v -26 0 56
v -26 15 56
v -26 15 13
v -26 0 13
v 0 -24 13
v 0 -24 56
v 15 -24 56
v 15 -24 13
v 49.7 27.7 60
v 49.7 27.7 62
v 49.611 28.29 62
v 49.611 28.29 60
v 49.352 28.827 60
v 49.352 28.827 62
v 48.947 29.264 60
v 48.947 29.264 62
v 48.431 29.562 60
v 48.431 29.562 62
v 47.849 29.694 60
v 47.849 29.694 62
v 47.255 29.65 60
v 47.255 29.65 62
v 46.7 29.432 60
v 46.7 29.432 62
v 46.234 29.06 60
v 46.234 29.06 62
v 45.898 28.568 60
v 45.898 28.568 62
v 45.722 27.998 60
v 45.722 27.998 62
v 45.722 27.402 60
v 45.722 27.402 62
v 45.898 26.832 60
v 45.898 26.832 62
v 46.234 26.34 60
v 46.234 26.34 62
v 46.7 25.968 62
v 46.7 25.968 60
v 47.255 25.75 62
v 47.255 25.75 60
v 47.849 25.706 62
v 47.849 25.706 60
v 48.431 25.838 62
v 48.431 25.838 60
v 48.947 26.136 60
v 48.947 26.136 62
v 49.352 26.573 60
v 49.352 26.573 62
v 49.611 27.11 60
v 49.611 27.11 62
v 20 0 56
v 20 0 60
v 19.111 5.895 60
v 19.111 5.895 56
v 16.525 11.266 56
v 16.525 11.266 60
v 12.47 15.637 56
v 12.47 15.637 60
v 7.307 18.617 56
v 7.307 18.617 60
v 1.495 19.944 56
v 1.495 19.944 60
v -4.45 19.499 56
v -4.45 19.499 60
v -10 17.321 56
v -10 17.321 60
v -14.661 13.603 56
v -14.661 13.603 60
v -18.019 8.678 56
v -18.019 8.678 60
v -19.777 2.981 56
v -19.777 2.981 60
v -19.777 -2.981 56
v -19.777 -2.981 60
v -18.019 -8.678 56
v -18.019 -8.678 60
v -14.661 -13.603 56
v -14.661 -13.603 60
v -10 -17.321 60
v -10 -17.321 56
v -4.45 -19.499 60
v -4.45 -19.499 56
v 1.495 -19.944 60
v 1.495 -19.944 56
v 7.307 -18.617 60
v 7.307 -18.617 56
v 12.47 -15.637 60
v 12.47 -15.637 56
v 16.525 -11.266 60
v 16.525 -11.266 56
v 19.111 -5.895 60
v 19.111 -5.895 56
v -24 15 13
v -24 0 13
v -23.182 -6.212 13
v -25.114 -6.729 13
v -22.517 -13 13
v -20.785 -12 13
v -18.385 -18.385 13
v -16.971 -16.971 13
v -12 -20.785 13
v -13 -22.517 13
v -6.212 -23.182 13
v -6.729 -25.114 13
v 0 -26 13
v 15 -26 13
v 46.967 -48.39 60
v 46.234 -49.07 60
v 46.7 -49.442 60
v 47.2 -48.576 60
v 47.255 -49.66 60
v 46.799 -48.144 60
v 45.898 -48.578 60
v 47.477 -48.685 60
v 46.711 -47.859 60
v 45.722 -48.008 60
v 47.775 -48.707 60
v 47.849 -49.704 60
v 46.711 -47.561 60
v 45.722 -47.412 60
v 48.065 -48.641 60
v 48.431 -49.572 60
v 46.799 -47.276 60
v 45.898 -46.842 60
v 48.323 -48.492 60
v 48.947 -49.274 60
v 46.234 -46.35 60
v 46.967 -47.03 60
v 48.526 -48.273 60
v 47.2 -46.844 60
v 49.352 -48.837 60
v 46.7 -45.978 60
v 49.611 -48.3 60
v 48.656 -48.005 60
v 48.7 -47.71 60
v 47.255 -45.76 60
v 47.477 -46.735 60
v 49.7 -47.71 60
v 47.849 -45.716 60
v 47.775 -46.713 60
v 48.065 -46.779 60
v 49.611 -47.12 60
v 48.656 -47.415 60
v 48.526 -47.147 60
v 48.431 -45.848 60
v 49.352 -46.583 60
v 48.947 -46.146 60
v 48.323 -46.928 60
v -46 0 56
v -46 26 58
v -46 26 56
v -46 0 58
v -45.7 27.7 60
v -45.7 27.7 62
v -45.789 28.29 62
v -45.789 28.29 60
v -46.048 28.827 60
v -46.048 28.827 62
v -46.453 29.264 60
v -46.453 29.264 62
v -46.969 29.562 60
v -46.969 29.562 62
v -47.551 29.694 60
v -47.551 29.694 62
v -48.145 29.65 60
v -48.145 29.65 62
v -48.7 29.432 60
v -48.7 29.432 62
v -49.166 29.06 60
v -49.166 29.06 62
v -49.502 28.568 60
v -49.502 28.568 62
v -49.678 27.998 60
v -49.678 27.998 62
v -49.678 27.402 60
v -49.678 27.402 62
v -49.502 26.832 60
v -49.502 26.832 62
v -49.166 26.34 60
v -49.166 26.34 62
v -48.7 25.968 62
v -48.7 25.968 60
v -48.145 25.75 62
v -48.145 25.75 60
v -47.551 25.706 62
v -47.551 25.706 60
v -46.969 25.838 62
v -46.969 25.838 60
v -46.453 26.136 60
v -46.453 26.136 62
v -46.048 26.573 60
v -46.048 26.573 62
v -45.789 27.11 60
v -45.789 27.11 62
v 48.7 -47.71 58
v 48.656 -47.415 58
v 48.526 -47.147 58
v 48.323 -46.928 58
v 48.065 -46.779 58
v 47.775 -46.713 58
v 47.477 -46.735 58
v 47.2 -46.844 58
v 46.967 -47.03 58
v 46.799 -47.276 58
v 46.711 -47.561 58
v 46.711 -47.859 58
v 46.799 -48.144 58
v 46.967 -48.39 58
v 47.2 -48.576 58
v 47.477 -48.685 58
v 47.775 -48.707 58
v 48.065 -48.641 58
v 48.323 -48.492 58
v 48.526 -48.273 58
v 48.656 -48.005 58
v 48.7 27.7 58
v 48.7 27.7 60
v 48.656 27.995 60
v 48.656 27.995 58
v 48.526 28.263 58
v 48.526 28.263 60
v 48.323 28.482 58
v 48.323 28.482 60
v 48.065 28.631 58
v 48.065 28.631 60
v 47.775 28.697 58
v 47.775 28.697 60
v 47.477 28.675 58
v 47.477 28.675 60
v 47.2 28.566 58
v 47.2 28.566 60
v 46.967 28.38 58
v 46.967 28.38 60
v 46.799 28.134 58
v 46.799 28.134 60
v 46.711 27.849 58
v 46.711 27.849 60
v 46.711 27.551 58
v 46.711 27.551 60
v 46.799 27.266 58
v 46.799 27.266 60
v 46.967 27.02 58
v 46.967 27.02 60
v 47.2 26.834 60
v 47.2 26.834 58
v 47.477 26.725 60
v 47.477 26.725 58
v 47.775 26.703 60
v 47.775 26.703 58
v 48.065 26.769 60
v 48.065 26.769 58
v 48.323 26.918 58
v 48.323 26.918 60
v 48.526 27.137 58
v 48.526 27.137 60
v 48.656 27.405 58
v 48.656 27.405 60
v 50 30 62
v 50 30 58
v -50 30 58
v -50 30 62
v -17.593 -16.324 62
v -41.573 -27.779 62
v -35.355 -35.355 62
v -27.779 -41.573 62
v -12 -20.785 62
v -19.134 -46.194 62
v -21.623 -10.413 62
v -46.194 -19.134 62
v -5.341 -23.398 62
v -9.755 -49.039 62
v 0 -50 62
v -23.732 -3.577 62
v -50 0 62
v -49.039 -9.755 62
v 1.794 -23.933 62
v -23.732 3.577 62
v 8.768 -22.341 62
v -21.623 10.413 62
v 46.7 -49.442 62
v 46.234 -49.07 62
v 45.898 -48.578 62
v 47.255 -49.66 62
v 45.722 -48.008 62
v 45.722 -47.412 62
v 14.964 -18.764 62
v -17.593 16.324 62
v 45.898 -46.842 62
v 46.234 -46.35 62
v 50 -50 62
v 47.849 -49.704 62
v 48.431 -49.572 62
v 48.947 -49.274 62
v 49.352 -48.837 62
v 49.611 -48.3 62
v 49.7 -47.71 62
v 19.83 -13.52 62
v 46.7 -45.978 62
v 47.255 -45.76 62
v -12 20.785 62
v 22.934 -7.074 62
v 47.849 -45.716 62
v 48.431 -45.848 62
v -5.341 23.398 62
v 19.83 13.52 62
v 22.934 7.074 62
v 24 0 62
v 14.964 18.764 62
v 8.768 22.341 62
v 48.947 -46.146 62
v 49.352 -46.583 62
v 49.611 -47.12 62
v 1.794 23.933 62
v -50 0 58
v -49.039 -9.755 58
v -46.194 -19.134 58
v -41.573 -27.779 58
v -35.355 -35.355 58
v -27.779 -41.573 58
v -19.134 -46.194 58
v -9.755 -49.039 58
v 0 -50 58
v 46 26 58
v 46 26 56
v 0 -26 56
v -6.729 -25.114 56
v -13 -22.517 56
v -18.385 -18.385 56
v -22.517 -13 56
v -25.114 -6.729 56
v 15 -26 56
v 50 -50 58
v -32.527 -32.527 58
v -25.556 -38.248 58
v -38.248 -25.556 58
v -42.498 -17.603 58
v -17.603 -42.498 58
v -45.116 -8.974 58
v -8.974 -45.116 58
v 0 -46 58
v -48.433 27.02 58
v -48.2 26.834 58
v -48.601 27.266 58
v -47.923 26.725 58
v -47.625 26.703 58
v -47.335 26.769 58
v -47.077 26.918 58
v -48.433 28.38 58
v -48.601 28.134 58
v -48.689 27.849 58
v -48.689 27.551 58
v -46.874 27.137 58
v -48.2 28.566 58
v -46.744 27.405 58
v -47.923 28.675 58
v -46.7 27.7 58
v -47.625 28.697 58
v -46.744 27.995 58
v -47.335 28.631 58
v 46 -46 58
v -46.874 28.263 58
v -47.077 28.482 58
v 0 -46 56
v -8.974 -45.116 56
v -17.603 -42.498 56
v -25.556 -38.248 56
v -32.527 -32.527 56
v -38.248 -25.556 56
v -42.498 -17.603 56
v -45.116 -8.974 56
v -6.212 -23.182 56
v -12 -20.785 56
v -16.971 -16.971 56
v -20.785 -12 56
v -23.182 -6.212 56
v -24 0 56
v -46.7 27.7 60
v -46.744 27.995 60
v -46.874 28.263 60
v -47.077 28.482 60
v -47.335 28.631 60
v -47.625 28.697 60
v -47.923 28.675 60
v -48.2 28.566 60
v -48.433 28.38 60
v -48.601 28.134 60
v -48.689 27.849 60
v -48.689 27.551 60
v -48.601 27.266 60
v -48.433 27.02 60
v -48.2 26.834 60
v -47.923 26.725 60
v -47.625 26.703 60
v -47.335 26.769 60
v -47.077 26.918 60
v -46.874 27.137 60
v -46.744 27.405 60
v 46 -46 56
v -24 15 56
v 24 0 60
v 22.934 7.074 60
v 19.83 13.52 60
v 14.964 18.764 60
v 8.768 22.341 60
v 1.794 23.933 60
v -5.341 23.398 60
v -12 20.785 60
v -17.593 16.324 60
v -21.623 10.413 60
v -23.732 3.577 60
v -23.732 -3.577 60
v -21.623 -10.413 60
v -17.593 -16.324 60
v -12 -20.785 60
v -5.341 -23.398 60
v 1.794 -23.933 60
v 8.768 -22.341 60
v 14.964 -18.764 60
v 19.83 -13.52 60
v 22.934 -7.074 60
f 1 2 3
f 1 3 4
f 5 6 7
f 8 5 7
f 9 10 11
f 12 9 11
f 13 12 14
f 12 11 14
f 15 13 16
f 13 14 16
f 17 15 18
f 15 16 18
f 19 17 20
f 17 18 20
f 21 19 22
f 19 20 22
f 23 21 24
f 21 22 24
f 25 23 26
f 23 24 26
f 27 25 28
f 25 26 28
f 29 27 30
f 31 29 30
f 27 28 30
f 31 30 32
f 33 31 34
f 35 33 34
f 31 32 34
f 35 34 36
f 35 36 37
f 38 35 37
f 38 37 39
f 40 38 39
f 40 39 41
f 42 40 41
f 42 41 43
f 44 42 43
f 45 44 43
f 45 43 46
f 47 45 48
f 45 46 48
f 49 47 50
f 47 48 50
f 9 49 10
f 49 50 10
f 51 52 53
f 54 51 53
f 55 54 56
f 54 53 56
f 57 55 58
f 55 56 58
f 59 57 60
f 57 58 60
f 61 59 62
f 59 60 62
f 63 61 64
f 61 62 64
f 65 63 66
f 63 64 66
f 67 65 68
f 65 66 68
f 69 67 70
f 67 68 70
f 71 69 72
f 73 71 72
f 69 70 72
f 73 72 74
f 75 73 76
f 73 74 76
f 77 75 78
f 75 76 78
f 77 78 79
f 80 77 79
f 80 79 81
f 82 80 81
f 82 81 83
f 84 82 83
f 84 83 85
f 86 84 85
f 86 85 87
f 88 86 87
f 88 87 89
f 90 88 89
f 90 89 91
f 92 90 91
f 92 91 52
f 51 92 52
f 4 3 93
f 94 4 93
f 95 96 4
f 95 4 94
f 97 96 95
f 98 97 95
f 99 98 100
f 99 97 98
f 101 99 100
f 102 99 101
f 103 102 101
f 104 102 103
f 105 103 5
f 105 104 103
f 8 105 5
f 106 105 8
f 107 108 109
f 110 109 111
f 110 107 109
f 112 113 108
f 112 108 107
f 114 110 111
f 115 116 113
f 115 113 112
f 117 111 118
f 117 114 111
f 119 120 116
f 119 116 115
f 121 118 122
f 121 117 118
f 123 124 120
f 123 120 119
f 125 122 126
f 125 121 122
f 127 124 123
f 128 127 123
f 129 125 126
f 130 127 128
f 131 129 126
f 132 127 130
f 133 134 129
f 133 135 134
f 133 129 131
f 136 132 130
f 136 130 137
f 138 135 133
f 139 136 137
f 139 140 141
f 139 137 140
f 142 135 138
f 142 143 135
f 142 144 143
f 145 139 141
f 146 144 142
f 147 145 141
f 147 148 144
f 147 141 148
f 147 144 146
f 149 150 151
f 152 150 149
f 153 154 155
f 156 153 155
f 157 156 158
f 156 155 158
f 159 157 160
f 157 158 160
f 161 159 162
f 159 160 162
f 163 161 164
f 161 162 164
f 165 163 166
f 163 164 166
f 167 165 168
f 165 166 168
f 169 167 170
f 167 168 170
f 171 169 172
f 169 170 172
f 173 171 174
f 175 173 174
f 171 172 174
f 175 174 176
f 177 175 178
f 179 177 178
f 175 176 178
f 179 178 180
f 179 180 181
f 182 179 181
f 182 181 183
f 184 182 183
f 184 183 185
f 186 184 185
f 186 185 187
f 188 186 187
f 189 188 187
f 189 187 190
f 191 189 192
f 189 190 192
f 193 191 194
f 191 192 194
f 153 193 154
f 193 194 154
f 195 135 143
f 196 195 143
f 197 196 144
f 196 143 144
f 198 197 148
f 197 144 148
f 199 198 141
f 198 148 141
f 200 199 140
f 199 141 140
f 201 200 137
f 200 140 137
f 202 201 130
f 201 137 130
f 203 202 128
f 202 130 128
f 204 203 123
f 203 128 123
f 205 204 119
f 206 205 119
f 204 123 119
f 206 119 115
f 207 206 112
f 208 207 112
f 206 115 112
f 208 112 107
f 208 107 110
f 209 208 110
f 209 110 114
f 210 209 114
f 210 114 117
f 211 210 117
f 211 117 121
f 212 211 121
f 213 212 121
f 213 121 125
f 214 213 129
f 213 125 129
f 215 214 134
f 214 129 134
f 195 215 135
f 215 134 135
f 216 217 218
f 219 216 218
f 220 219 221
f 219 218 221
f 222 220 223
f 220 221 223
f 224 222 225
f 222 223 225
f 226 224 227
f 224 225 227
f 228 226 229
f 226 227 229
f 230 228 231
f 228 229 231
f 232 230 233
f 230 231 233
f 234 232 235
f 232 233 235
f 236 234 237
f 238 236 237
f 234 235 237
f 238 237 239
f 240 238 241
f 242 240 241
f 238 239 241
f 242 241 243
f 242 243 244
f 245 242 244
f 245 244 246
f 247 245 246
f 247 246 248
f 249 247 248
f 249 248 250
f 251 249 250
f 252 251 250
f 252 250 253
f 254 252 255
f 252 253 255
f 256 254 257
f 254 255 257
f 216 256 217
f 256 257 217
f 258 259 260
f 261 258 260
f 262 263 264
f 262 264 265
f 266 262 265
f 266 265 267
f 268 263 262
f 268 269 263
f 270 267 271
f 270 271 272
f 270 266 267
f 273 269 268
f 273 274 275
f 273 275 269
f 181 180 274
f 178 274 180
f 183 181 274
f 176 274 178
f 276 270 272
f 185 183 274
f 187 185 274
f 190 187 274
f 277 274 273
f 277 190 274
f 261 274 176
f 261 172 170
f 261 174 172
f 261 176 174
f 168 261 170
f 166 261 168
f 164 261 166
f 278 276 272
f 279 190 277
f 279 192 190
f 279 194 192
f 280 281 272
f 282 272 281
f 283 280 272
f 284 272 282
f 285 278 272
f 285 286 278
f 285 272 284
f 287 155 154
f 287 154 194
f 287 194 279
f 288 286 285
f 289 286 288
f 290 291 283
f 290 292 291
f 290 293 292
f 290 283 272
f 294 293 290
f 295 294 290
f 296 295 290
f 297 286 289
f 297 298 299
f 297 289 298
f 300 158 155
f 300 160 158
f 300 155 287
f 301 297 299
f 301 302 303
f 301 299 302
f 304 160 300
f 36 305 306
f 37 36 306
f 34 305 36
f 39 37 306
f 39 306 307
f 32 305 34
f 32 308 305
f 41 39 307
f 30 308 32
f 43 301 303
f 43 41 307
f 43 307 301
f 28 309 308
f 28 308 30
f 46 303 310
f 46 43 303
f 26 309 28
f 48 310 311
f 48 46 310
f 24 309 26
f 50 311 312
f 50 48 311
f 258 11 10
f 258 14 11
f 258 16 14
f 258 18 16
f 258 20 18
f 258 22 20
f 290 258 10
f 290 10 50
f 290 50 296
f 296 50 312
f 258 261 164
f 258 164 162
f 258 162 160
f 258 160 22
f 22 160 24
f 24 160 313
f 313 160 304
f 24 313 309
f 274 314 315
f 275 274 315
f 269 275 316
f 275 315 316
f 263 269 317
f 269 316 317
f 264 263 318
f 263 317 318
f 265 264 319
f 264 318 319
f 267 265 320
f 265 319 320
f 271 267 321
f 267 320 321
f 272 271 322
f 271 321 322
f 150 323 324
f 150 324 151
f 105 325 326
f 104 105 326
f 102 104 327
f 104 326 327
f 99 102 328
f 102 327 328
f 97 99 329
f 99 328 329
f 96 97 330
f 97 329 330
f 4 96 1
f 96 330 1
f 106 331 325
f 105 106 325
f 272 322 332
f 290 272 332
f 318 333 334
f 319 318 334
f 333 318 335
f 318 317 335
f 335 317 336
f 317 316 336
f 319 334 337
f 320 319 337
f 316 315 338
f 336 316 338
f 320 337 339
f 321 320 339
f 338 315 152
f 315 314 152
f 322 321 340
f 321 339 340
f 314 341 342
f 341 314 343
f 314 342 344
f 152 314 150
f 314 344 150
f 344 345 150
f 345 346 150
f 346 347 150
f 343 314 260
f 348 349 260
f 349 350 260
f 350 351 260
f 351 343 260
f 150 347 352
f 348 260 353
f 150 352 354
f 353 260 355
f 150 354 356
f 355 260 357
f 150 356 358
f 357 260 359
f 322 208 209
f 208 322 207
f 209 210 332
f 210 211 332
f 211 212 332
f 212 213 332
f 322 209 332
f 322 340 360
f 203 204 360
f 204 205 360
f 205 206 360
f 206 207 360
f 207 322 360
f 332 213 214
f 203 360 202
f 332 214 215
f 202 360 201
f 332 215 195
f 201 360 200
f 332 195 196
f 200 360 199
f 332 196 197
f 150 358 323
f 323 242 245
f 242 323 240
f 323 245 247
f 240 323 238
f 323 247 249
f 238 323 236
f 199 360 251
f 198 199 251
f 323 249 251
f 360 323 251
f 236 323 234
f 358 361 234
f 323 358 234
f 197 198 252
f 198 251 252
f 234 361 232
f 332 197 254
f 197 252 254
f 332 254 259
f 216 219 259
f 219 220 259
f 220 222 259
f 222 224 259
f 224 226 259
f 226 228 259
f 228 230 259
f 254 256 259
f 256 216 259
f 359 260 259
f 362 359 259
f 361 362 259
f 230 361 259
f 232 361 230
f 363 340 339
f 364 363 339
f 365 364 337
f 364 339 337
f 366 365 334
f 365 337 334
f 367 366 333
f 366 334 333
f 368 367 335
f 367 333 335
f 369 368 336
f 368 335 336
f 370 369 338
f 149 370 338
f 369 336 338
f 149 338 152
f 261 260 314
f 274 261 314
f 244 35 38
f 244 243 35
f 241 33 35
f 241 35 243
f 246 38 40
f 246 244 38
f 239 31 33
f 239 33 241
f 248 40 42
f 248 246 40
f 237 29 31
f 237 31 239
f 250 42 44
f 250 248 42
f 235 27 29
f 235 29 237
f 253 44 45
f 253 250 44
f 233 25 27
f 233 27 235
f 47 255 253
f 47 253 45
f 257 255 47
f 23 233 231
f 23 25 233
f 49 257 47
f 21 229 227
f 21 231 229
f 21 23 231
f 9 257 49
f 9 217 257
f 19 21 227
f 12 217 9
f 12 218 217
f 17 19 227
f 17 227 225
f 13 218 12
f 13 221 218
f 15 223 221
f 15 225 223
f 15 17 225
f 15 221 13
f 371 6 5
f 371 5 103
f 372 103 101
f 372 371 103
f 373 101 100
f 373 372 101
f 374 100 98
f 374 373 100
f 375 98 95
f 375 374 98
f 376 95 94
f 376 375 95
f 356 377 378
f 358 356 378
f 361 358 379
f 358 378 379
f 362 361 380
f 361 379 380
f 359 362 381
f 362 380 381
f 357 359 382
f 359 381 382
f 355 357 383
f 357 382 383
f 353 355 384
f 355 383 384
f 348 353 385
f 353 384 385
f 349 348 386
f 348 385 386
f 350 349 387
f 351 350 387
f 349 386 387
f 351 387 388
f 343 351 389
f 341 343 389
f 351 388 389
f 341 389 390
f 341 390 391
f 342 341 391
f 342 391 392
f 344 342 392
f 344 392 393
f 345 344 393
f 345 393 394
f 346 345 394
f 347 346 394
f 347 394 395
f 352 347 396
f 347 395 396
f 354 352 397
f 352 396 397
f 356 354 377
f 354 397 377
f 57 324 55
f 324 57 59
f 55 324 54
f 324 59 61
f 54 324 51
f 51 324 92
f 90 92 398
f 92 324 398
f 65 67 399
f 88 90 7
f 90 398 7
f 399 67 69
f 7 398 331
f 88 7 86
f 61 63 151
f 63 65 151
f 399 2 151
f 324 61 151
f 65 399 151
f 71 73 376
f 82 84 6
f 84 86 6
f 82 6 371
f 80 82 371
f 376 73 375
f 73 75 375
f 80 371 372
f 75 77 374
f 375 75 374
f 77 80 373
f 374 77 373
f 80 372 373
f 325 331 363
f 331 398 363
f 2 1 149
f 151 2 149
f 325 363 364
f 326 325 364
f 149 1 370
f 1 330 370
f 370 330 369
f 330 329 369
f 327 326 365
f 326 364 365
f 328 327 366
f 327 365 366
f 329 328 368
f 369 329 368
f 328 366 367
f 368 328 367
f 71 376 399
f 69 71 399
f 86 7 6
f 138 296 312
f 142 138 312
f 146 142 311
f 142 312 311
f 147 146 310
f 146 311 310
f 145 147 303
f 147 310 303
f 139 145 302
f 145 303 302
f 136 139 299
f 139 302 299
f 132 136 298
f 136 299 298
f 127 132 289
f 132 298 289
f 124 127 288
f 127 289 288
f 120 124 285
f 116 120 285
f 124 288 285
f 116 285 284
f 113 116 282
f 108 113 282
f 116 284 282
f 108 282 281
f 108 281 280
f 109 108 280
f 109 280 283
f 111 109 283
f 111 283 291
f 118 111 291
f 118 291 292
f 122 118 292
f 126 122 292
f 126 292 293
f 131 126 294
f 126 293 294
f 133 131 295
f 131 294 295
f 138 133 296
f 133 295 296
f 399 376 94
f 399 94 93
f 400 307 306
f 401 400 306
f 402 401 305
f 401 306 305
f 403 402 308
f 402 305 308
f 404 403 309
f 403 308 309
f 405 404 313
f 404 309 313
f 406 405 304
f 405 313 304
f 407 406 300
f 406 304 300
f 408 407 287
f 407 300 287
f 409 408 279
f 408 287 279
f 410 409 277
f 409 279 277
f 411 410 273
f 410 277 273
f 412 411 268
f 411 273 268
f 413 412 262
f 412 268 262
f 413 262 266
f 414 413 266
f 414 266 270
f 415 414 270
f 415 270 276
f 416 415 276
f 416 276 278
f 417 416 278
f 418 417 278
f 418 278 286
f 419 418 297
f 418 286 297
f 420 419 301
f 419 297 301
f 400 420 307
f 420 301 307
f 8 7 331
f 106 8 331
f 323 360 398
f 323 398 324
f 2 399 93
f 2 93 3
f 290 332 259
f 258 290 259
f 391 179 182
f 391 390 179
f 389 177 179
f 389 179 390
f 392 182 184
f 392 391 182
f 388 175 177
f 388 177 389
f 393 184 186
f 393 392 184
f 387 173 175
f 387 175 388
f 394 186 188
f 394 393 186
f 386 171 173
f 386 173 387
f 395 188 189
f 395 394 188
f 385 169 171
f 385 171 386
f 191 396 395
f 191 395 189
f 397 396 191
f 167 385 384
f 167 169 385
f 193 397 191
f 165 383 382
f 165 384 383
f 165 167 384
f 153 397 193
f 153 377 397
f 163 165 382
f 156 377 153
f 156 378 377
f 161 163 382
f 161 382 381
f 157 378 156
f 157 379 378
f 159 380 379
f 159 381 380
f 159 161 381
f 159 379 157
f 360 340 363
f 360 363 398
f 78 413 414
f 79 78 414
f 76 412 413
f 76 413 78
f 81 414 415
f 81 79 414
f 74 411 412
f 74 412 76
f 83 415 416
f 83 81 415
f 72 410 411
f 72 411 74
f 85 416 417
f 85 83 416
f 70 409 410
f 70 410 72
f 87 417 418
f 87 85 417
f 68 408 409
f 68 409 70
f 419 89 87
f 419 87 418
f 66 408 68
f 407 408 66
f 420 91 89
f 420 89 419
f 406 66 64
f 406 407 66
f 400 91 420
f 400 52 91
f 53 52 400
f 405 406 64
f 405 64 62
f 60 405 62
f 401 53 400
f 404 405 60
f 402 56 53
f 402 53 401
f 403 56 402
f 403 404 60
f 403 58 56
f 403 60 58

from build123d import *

# Parameters (mm, degrees)
PAD012_DEPTH    = 4
PAD013_DEPTH    = 45
PAD014_DEPTH    = 2
SKETCH043_R     = 20
POCKET021_DEPTH = 6
SKETCH044_R     = 24
POCKET022_DEPTH = 2
SKETCH052_R     = 2
POCKET025_DEPTH = 2
SKETCH053_R     = 1
POCKET026_DEPTH = 2


with BuildPart() as part:
    # Sketch036 (on Face1 of CopyPad006) → Pad012 (new body)
    with BuildSketch(Plane.XY.offset(58)):
        with BuildLine():
            Line((0, -50), (50, -50))
            Line((50, -50), (50, 30))
            Line((50, 30), (-50, 30))
            Line((-50, 30), (-50, 0))
            ThreePointArc((-50, 0), (-35.3553390593, -35.3553390593), (0, -50))
        make_face()
    extrude(amount=PAD012_DEPTH)

    # Sketch037 (on Face6 of Pad012) → Pad013 (join)
    with BuildSketch(Plane(origin=(0, 0, 58), x_dir=(1, 0, 0), z_dir=(0, 0, -1))):
        with BuildLine():
            ThreePointArc((0, 26), (-18.3847763109, 18.3847763108), (-26, 0))
            Line((-26, -15), (-26, 0))
            Line((-24, -15), (-26, -15))
            Line((-24, 0), (-24, -15))
            ThreePointArc((0, 24), (-16.9705627485, 16.9705627485), (-24, 0))
            Line((0, 24), (15, 24))
            Line((15, 24), (15, 26))
            Line((15, 26), (0, 26))
        make_face()
    extrude(amount=PAD013_DEPTH)

    # Sketch038 (on Face4 of Pad013) → Pad014 (join)
    with BuildSketch(Plane(origin=(0, 0, 58), x_dir=(1, 0, 0), z_dir=(0, 0, -1))):
        with BuildLine():
            Line((0, 46), (46, 46))
            Line((46, 46), (46, -26))
            Line((46, -26), (-46, -26))
            Line((-46, -26), (-46, 0))
            ThreePointArc((0, 46), (-32.5269119346, 32.5269119346), (-46, 0))
        make_face()
    extrude(amount=PAD014_DEPTH)

    # Sketch043 (on Face5 of Pad014) → Pocket021 (cut)
    with BuildSketch(Plane.XY.offset(62)):
        Circle(SKETCH043_R)
    extrude(amount=-POCKET021_DEPTH, mode=Mode.SUBTRACT)

    # Sketch044 (on Face5 of Pocket021) → Pocket022 (cut)
    with BuildSketch(Plane.XY.offset(62)):
        Circle(SKETCH044_R)
    extrude(amount=-POCKET022_DEPTH, mode=Mode.SUBTRACT)

    # Sketch052 (on Face5 of Pocket022) → Pocket025 (cut)
    with BuildSketch(Plane.XY.offset(62)):
        with Locations((-47.7, 27.7)):
            Circle(SKETCH052_R)
        with Locations((47.7, 27.7)):
            Circle(SKETCH052_R)
        with Locations((47.7, -47.71)):
            Circle(SKETCH052_R)
    extrude(amount=-POCKET025_DEPTH, mode=Mode.SUBTRACT)

    # Sketch053 (on Face21 of Pocket025) → Pocket026 (cut)
    with BuildSketch(Plane.XY.offset(60)):
        with Locations((-47.7, 27.7)):
            Circle(SKETCH053_R)
        with Locations((47.7, 27.7)):
            Circle(SKETCH053_R)
        with Locations((47.7, -47.71)):
            Circle(SKETCH053_R)
    extrude(amount=-POCKET026_DEPTH, mode=Mode.SUBTRACT)


solid = part.part
